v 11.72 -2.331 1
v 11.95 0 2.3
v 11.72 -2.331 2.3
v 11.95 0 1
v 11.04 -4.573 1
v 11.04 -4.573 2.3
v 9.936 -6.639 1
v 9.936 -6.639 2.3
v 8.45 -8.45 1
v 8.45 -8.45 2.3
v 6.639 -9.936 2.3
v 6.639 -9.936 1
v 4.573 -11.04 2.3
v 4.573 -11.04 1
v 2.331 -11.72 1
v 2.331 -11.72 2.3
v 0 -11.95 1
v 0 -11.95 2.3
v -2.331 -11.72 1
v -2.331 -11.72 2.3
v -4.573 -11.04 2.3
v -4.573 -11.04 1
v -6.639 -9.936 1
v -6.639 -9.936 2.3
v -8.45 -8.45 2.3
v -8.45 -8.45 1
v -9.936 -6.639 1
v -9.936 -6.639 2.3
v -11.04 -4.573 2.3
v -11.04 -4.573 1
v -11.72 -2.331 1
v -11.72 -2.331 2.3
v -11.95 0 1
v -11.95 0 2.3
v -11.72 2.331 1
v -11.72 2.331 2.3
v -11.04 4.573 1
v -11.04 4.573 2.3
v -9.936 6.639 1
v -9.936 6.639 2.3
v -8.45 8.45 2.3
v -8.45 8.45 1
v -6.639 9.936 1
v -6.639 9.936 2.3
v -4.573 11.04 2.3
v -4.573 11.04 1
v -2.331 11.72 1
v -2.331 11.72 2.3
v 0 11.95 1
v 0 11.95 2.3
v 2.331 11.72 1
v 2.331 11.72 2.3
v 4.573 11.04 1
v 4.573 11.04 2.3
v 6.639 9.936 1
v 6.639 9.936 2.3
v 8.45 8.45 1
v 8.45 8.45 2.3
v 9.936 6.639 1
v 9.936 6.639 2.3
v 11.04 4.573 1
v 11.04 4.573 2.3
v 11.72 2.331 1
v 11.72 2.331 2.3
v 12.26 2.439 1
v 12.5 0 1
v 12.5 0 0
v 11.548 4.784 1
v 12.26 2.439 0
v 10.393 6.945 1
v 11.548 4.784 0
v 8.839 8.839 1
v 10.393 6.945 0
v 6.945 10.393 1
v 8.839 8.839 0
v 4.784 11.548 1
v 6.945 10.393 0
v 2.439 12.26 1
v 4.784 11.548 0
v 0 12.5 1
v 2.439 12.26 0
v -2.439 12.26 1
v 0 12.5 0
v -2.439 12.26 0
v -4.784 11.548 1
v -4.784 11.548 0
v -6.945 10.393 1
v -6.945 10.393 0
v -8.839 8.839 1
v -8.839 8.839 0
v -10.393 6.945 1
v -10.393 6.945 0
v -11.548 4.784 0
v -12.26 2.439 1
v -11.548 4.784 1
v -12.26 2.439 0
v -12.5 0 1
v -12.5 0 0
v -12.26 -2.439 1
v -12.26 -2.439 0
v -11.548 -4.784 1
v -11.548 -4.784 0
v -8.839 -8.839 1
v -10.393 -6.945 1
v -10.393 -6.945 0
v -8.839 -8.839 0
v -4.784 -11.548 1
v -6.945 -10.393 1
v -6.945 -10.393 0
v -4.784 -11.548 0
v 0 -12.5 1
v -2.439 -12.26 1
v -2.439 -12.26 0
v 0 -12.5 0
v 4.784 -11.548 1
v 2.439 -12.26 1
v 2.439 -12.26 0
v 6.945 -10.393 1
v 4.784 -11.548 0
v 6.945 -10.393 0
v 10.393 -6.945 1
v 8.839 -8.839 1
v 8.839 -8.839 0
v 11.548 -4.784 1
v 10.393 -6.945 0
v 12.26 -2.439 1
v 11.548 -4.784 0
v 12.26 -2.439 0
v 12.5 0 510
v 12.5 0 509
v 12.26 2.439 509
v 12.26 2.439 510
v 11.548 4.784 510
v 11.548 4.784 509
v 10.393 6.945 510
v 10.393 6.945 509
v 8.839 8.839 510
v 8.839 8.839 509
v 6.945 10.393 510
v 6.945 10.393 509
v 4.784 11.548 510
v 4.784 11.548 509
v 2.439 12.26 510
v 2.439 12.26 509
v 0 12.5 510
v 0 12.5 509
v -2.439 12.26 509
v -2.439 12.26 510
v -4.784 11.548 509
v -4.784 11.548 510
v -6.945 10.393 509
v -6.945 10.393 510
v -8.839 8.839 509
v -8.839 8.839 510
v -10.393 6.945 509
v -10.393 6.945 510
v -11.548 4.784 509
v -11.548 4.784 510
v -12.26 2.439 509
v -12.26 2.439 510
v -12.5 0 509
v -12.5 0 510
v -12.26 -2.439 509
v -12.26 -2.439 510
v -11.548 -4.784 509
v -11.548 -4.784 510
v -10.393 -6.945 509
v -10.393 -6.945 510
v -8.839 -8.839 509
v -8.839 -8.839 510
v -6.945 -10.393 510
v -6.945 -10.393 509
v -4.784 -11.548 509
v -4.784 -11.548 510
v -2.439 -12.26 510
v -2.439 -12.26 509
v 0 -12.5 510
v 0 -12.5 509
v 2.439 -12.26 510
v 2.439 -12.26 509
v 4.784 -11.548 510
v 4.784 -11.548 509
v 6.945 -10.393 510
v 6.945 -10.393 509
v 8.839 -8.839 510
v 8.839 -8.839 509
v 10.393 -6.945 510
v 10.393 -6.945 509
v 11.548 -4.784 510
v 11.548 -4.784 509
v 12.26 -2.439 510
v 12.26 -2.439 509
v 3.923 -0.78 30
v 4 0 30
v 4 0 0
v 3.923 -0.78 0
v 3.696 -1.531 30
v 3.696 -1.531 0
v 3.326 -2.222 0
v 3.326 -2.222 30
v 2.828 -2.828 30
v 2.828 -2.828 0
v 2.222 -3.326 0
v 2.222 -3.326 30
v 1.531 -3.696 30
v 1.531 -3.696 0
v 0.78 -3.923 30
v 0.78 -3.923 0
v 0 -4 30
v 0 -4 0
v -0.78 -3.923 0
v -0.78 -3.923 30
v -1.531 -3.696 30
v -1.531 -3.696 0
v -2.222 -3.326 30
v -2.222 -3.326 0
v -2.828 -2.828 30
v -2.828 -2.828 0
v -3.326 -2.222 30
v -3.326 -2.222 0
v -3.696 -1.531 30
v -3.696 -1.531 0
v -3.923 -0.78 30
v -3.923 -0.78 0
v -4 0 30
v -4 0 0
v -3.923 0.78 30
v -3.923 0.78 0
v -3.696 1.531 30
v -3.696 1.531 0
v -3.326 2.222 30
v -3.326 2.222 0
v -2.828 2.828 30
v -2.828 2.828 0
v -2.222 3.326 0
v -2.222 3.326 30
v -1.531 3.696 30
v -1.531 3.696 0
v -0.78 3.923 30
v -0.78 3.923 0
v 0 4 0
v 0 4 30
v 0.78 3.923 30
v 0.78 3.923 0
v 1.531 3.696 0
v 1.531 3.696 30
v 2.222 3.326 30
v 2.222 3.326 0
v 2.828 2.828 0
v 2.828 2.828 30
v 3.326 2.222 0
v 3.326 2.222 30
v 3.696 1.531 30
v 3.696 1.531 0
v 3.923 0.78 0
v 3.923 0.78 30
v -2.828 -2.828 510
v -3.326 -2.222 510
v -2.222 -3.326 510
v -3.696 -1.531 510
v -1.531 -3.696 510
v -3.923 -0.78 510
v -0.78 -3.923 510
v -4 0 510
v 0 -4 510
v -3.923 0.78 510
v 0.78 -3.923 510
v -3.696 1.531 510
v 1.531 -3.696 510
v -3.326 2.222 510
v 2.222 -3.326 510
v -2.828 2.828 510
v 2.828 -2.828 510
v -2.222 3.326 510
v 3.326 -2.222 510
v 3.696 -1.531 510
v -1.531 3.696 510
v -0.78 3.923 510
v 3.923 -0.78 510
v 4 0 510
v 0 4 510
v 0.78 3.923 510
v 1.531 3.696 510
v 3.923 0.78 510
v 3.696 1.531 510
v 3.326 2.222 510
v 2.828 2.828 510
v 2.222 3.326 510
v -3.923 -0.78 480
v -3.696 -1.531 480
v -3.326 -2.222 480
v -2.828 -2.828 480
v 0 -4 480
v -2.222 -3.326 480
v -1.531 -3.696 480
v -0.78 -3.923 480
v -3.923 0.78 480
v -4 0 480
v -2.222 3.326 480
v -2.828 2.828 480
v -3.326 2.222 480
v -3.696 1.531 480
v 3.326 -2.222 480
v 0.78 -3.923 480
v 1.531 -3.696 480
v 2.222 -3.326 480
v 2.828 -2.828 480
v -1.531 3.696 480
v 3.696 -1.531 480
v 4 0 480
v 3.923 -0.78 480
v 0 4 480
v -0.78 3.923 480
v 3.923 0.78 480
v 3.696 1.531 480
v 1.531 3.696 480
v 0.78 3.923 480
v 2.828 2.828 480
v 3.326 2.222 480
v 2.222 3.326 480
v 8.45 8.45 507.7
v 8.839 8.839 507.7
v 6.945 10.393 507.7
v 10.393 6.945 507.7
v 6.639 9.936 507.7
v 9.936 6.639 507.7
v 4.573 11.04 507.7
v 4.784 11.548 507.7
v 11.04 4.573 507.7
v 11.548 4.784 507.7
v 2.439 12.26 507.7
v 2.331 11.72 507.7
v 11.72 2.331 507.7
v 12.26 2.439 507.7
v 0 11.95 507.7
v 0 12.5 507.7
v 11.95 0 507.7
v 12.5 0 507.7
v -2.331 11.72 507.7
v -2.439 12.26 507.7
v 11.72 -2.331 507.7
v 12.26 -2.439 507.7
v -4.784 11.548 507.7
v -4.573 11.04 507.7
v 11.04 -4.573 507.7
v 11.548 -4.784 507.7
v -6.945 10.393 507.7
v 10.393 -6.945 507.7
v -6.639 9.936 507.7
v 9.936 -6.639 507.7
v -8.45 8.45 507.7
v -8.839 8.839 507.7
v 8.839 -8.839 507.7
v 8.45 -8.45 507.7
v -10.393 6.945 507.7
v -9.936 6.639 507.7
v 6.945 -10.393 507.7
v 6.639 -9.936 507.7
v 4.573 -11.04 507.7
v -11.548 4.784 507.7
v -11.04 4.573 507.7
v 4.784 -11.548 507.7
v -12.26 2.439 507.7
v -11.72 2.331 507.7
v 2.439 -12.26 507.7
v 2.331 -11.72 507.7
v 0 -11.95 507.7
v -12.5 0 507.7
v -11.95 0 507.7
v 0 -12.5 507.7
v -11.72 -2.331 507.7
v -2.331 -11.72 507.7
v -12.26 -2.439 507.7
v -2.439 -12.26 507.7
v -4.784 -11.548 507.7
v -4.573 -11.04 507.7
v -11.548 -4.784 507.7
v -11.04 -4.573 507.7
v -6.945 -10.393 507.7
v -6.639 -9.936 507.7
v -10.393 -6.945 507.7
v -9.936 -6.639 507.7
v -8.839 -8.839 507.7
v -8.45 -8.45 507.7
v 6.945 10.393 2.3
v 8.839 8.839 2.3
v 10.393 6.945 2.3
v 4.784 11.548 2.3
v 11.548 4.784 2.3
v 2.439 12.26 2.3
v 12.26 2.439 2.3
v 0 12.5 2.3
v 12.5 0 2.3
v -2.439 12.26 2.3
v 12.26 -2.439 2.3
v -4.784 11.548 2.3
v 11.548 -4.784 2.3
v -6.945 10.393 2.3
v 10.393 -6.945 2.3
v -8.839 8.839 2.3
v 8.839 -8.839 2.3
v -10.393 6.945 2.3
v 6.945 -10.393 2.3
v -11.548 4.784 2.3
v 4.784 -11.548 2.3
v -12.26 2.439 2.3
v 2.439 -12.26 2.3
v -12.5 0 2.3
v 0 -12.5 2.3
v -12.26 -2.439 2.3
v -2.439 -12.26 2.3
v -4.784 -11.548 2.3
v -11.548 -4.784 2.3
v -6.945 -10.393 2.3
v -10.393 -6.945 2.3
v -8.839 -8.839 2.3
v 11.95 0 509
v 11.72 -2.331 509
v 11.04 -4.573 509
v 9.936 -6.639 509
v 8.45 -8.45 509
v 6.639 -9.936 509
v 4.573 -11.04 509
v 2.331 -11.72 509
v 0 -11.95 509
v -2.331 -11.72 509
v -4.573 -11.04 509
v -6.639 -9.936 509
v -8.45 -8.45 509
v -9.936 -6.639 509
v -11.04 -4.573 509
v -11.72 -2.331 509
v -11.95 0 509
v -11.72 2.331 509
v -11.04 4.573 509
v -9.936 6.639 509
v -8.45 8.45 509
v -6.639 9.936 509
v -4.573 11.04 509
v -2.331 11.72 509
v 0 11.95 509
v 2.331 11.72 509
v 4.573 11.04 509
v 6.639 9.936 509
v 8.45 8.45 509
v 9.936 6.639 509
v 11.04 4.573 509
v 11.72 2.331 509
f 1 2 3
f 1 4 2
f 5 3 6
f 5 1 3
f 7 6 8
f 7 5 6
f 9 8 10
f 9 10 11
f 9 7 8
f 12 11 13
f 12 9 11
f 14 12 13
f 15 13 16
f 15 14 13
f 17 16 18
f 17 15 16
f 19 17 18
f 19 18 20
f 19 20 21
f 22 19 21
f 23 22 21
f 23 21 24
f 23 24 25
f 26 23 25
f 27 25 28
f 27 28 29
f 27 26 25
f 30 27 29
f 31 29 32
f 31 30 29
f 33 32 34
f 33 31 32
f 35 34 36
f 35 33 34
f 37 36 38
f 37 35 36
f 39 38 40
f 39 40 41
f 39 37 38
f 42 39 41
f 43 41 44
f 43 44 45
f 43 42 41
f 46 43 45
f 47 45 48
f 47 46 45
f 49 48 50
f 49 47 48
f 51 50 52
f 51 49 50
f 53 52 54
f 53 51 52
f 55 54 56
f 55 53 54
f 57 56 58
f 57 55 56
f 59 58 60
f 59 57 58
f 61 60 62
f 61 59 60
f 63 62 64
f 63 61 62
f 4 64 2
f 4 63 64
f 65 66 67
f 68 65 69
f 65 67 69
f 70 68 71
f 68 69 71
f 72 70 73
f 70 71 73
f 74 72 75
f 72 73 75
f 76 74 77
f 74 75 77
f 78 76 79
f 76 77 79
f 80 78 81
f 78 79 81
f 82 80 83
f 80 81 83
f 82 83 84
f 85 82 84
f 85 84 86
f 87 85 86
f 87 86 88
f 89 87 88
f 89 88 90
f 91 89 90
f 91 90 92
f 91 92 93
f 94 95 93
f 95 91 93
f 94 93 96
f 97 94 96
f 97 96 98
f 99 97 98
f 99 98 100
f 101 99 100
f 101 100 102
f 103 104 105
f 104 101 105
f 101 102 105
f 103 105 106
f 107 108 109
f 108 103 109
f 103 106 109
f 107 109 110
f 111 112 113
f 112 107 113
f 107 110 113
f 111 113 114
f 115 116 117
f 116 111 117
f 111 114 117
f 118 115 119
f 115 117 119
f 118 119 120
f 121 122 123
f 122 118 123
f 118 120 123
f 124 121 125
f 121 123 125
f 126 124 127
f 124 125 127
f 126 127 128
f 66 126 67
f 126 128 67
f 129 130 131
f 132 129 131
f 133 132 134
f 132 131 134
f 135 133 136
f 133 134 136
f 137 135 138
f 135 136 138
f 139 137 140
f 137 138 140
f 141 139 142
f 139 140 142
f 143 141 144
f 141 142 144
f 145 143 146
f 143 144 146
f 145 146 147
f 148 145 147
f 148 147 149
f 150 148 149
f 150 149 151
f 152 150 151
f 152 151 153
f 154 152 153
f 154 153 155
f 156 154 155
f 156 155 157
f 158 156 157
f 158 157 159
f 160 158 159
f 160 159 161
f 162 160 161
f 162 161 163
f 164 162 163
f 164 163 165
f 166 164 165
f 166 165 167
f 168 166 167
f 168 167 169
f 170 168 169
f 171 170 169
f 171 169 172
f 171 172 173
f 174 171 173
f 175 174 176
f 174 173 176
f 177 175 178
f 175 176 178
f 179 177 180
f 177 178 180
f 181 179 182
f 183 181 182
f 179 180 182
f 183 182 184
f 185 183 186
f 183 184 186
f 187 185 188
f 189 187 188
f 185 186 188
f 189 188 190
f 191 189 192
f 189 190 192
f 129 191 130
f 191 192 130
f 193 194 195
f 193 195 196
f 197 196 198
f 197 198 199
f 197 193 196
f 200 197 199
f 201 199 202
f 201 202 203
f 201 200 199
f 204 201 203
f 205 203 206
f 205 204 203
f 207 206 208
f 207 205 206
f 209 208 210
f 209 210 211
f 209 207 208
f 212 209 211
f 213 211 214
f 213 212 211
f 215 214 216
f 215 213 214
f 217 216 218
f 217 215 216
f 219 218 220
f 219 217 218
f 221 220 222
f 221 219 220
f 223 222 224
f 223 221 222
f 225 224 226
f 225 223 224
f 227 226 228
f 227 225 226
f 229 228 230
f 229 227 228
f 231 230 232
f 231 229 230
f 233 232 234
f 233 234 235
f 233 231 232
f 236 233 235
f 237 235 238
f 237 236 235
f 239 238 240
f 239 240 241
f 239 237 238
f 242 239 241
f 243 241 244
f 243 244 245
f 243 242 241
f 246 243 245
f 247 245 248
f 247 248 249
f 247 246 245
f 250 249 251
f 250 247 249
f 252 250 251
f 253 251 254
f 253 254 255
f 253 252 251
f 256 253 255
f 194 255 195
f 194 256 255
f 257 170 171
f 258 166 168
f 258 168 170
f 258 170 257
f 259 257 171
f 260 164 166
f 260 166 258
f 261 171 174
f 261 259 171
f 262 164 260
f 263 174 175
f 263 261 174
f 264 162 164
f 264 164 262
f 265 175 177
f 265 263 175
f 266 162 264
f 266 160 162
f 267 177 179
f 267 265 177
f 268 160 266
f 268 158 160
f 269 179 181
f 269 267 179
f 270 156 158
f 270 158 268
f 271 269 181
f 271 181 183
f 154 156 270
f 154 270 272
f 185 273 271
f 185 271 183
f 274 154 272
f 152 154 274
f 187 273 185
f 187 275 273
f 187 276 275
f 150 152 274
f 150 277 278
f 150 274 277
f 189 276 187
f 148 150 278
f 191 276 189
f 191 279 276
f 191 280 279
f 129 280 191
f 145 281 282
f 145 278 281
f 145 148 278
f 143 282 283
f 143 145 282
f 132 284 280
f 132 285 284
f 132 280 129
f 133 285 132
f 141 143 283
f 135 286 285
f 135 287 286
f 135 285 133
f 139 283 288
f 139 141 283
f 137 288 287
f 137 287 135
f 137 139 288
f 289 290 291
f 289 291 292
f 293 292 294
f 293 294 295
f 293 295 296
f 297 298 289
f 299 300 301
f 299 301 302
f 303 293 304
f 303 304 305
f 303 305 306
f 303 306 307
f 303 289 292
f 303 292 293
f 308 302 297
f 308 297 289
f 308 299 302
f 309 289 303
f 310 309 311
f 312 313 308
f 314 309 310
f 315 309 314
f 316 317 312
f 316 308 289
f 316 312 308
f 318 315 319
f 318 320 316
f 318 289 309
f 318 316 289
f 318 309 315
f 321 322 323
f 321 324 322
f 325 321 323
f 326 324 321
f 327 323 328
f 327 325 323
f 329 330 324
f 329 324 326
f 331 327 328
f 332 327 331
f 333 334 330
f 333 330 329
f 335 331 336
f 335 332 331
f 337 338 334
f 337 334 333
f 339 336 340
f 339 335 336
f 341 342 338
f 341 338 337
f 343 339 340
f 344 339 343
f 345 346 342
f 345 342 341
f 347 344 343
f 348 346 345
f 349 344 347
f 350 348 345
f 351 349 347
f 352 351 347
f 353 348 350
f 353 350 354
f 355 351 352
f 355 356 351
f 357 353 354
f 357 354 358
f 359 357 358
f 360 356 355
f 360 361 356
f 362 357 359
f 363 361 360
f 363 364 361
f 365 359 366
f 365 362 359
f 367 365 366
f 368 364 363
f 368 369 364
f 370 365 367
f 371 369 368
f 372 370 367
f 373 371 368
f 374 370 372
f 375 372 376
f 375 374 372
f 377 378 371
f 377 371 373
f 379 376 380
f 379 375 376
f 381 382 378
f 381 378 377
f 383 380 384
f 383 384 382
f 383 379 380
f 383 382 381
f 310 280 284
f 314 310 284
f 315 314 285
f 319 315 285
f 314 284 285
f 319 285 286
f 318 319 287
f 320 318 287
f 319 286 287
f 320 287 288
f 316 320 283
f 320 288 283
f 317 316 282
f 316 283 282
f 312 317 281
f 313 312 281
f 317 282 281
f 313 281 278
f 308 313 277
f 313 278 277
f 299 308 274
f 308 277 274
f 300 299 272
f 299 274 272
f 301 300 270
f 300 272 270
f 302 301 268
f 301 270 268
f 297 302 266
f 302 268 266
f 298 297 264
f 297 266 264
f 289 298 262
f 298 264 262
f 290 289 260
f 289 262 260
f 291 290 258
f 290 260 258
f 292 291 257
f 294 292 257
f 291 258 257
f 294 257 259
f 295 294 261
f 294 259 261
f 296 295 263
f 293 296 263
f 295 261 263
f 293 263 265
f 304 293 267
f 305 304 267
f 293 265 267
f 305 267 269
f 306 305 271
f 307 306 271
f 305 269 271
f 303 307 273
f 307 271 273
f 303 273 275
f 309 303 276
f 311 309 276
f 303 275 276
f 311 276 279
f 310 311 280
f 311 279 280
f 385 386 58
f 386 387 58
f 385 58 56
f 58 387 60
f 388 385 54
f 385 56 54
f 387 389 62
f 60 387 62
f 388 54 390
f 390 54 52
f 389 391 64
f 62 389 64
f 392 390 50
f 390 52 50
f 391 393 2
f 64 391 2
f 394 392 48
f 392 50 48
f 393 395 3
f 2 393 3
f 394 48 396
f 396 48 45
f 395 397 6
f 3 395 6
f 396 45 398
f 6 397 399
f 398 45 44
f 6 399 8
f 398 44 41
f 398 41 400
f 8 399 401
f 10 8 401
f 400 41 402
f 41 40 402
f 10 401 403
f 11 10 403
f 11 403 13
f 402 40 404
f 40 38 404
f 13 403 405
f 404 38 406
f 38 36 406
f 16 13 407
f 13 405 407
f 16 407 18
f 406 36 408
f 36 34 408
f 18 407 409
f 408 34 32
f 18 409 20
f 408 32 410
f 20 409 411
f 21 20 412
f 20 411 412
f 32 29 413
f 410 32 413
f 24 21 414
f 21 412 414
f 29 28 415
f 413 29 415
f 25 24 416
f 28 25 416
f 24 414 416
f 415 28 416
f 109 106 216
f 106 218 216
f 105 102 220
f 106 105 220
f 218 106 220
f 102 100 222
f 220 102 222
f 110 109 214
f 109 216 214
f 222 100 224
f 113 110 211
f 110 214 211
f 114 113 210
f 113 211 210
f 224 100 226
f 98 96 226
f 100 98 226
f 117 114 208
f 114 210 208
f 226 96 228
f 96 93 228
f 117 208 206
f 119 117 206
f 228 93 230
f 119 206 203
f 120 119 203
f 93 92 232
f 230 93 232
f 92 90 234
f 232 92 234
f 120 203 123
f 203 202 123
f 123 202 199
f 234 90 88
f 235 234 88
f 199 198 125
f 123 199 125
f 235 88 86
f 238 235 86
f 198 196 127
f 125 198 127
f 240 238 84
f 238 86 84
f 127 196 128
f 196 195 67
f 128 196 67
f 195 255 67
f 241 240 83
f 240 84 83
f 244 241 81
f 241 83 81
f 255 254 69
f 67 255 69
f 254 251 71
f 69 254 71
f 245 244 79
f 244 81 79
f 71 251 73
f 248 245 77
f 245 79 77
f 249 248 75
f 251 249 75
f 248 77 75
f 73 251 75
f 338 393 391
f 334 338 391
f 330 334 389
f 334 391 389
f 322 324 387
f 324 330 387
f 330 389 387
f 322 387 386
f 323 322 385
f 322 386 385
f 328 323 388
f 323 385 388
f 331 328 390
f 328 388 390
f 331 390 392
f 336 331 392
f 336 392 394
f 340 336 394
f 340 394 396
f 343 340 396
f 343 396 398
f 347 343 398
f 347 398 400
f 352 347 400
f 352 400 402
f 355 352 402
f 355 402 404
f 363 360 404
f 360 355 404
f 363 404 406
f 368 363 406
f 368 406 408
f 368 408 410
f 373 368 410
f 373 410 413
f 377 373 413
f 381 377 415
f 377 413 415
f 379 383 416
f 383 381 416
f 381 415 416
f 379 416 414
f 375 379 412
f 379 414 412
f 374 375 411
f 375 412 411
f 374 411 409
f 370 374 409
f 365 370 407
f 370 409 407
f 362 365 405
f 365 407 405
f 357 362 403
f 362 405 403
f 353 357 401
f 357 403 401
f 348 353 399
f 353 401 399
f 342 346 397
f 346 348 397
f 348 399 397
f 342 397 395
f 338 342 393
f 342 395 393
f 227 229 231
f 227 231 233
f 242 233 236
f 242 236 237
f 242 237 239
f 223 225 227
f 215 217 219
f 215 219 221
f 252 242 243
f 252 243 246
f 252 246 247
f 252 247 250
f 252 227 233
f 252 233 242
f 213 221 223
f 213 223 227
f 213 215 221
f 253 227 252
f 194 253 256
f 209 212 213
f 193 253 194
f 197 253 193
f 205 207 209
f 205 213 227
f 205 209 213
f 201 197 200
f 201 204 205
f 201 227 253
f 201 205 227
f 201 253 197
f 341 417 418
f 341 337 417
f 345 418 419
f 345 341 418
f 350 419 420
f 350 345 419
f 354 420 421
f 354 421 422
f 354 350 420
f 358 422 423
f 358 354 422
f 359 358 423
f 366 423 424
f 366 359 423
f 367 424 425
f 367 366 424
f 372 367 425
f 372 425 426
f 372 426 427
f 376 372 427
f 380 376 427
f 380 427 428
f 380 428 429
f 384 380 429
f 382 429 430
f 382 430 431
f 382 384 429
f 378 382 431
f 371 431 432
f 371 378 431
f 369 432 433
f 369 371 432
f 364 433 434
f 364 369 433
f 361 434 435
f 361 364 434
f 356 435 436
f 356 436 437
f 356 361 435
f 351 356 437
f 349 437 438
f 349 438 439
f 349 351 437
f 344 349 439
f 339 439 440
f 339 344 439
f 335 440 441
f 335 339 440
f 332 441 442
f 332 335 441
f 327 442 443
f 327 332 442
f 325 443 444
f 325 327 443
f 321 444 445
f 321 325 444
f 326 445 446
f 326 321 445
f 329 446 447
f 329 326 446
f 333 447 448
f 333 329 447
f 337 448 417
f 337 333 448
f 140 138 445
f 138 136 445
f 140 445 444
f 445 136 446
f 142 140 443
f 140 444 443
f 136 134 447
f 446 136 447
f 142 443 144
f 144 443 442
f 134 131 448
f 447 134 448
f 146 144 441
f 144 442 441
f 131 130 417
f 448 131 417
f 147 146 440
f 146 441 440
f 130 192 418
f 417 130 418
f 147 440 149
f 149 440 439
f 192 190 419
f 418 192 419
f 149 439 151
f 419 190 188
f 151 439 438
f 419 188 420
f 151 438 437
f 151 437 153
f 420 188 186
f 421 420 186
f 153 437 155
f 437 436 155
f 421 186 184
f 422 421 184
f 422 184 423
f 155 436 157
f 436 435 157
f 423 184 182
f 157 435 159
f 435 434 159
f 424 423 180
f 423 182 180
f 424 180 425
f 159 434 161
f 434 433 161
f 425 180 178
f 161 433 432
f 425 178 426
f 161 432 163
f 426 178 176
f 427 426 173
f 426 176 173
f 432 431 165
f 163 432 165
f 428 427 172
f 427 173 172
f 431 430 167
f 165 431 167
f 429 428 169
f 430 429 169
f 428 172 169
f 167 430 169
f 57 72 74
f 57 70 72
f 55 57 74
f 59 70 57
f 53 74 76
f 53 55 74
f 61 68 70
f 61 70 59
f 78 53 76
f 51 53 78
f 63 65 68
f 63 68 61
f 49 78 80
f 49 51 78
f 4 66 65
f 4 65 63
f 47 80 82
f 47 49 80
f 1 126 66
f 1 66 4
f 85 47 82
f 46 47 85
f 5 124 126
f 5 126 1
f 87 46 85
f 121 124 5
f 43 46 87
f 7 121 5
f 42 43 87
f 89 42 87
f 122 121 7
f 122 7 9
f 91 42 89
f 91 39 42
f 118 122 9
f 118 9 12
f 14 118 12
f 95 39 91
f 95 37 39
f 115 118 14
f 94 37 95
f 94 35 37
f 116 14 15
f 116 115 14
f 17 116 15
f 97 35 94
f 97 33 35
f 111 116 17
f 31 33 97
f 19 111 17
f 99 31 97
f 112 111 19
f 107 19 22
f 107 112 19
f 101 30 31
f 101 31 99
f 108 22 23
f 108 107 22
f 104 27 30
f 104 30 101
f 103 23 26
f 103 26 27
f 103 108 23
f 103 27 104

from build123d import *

# Parameters (mm, degrees)
SCHIZZO1_R               = 12.5
ESTRUSIONE1_DEPTH        = 510
SCHIZZO2_R               = 4
TAGLIO_ESTRUSIONE1_DEPTH = 30
TAGLIO_ESTRUSIONE2_START = -30
SCHIZZO3_R               = 4
TAGLIO_ESTRUSIONE2_DEPTH = 30
SCHIZZO5_W               = 1.3
SCHIZZO5_H               = 0.55


with BuildPart() as part:
    # Schizzo1 → Estrusione1 (new body)
    with BuildSketch(Plane.XY):
        Circle(SCHIZZO1_R)
    extrude(amount=ESTRUSIONE1_DEPTH)

    # Schizzo2 → Taglio-Estrusione1 (cut)
    with BuildSketch(Plane.XY.offset(510)):
        Circle(SCHIZZO2_R)
    extrude(amount=-TAGLIO_ESTRUSIONE1_DEPTH, mode=Mode.SUBTRACT)

    # Schizzo3 → Taglio-Estrusione2 (cut)
    with BuildSketch(Plane(origin=(0, 0, 0), x_dir=(-1, 0, 0), z_dir=(0, 0, -1)).offset(TAGLIO_ESTRUSIONE2_START)):
        with Locations(Location((0, 0, 0), (0, 0, 180))):
            Circle(SCHIZZO3_R)
    extrude(amount=TAGLIO_ESTRUSIONE2_DEPTH, mode=Mode.SUBTRACT)

    # Schizzo5 → Taglia-Rivoluzione1 (revolve, cut)
    with BuildSketch(Plane(origin=(0, 0, 0), x_dir=(0, 0, -1), z_dir=(1, 0, 0)), mode=Mode.PRIVATE) as taglia_rivoluzione1_sk:
        with Locations((-508.35, 12.225)):
            Rectangle(SCHIZZO5_W, SCHIZZO5_H)
        with Locations((-1.65, 12.225)):
            Rectangle(SCHIZZO5_W, SCHIZZO5_H)
    revolve(taglia_rivoluzione1_sk.sketch.rotate(Axis((0, 0, 510), (0, 0, -1)), 90), axis=Axis((0, 0, 510), (0, 0, -1)), mode=Mode.SUBTRACT)


solid = part.part
